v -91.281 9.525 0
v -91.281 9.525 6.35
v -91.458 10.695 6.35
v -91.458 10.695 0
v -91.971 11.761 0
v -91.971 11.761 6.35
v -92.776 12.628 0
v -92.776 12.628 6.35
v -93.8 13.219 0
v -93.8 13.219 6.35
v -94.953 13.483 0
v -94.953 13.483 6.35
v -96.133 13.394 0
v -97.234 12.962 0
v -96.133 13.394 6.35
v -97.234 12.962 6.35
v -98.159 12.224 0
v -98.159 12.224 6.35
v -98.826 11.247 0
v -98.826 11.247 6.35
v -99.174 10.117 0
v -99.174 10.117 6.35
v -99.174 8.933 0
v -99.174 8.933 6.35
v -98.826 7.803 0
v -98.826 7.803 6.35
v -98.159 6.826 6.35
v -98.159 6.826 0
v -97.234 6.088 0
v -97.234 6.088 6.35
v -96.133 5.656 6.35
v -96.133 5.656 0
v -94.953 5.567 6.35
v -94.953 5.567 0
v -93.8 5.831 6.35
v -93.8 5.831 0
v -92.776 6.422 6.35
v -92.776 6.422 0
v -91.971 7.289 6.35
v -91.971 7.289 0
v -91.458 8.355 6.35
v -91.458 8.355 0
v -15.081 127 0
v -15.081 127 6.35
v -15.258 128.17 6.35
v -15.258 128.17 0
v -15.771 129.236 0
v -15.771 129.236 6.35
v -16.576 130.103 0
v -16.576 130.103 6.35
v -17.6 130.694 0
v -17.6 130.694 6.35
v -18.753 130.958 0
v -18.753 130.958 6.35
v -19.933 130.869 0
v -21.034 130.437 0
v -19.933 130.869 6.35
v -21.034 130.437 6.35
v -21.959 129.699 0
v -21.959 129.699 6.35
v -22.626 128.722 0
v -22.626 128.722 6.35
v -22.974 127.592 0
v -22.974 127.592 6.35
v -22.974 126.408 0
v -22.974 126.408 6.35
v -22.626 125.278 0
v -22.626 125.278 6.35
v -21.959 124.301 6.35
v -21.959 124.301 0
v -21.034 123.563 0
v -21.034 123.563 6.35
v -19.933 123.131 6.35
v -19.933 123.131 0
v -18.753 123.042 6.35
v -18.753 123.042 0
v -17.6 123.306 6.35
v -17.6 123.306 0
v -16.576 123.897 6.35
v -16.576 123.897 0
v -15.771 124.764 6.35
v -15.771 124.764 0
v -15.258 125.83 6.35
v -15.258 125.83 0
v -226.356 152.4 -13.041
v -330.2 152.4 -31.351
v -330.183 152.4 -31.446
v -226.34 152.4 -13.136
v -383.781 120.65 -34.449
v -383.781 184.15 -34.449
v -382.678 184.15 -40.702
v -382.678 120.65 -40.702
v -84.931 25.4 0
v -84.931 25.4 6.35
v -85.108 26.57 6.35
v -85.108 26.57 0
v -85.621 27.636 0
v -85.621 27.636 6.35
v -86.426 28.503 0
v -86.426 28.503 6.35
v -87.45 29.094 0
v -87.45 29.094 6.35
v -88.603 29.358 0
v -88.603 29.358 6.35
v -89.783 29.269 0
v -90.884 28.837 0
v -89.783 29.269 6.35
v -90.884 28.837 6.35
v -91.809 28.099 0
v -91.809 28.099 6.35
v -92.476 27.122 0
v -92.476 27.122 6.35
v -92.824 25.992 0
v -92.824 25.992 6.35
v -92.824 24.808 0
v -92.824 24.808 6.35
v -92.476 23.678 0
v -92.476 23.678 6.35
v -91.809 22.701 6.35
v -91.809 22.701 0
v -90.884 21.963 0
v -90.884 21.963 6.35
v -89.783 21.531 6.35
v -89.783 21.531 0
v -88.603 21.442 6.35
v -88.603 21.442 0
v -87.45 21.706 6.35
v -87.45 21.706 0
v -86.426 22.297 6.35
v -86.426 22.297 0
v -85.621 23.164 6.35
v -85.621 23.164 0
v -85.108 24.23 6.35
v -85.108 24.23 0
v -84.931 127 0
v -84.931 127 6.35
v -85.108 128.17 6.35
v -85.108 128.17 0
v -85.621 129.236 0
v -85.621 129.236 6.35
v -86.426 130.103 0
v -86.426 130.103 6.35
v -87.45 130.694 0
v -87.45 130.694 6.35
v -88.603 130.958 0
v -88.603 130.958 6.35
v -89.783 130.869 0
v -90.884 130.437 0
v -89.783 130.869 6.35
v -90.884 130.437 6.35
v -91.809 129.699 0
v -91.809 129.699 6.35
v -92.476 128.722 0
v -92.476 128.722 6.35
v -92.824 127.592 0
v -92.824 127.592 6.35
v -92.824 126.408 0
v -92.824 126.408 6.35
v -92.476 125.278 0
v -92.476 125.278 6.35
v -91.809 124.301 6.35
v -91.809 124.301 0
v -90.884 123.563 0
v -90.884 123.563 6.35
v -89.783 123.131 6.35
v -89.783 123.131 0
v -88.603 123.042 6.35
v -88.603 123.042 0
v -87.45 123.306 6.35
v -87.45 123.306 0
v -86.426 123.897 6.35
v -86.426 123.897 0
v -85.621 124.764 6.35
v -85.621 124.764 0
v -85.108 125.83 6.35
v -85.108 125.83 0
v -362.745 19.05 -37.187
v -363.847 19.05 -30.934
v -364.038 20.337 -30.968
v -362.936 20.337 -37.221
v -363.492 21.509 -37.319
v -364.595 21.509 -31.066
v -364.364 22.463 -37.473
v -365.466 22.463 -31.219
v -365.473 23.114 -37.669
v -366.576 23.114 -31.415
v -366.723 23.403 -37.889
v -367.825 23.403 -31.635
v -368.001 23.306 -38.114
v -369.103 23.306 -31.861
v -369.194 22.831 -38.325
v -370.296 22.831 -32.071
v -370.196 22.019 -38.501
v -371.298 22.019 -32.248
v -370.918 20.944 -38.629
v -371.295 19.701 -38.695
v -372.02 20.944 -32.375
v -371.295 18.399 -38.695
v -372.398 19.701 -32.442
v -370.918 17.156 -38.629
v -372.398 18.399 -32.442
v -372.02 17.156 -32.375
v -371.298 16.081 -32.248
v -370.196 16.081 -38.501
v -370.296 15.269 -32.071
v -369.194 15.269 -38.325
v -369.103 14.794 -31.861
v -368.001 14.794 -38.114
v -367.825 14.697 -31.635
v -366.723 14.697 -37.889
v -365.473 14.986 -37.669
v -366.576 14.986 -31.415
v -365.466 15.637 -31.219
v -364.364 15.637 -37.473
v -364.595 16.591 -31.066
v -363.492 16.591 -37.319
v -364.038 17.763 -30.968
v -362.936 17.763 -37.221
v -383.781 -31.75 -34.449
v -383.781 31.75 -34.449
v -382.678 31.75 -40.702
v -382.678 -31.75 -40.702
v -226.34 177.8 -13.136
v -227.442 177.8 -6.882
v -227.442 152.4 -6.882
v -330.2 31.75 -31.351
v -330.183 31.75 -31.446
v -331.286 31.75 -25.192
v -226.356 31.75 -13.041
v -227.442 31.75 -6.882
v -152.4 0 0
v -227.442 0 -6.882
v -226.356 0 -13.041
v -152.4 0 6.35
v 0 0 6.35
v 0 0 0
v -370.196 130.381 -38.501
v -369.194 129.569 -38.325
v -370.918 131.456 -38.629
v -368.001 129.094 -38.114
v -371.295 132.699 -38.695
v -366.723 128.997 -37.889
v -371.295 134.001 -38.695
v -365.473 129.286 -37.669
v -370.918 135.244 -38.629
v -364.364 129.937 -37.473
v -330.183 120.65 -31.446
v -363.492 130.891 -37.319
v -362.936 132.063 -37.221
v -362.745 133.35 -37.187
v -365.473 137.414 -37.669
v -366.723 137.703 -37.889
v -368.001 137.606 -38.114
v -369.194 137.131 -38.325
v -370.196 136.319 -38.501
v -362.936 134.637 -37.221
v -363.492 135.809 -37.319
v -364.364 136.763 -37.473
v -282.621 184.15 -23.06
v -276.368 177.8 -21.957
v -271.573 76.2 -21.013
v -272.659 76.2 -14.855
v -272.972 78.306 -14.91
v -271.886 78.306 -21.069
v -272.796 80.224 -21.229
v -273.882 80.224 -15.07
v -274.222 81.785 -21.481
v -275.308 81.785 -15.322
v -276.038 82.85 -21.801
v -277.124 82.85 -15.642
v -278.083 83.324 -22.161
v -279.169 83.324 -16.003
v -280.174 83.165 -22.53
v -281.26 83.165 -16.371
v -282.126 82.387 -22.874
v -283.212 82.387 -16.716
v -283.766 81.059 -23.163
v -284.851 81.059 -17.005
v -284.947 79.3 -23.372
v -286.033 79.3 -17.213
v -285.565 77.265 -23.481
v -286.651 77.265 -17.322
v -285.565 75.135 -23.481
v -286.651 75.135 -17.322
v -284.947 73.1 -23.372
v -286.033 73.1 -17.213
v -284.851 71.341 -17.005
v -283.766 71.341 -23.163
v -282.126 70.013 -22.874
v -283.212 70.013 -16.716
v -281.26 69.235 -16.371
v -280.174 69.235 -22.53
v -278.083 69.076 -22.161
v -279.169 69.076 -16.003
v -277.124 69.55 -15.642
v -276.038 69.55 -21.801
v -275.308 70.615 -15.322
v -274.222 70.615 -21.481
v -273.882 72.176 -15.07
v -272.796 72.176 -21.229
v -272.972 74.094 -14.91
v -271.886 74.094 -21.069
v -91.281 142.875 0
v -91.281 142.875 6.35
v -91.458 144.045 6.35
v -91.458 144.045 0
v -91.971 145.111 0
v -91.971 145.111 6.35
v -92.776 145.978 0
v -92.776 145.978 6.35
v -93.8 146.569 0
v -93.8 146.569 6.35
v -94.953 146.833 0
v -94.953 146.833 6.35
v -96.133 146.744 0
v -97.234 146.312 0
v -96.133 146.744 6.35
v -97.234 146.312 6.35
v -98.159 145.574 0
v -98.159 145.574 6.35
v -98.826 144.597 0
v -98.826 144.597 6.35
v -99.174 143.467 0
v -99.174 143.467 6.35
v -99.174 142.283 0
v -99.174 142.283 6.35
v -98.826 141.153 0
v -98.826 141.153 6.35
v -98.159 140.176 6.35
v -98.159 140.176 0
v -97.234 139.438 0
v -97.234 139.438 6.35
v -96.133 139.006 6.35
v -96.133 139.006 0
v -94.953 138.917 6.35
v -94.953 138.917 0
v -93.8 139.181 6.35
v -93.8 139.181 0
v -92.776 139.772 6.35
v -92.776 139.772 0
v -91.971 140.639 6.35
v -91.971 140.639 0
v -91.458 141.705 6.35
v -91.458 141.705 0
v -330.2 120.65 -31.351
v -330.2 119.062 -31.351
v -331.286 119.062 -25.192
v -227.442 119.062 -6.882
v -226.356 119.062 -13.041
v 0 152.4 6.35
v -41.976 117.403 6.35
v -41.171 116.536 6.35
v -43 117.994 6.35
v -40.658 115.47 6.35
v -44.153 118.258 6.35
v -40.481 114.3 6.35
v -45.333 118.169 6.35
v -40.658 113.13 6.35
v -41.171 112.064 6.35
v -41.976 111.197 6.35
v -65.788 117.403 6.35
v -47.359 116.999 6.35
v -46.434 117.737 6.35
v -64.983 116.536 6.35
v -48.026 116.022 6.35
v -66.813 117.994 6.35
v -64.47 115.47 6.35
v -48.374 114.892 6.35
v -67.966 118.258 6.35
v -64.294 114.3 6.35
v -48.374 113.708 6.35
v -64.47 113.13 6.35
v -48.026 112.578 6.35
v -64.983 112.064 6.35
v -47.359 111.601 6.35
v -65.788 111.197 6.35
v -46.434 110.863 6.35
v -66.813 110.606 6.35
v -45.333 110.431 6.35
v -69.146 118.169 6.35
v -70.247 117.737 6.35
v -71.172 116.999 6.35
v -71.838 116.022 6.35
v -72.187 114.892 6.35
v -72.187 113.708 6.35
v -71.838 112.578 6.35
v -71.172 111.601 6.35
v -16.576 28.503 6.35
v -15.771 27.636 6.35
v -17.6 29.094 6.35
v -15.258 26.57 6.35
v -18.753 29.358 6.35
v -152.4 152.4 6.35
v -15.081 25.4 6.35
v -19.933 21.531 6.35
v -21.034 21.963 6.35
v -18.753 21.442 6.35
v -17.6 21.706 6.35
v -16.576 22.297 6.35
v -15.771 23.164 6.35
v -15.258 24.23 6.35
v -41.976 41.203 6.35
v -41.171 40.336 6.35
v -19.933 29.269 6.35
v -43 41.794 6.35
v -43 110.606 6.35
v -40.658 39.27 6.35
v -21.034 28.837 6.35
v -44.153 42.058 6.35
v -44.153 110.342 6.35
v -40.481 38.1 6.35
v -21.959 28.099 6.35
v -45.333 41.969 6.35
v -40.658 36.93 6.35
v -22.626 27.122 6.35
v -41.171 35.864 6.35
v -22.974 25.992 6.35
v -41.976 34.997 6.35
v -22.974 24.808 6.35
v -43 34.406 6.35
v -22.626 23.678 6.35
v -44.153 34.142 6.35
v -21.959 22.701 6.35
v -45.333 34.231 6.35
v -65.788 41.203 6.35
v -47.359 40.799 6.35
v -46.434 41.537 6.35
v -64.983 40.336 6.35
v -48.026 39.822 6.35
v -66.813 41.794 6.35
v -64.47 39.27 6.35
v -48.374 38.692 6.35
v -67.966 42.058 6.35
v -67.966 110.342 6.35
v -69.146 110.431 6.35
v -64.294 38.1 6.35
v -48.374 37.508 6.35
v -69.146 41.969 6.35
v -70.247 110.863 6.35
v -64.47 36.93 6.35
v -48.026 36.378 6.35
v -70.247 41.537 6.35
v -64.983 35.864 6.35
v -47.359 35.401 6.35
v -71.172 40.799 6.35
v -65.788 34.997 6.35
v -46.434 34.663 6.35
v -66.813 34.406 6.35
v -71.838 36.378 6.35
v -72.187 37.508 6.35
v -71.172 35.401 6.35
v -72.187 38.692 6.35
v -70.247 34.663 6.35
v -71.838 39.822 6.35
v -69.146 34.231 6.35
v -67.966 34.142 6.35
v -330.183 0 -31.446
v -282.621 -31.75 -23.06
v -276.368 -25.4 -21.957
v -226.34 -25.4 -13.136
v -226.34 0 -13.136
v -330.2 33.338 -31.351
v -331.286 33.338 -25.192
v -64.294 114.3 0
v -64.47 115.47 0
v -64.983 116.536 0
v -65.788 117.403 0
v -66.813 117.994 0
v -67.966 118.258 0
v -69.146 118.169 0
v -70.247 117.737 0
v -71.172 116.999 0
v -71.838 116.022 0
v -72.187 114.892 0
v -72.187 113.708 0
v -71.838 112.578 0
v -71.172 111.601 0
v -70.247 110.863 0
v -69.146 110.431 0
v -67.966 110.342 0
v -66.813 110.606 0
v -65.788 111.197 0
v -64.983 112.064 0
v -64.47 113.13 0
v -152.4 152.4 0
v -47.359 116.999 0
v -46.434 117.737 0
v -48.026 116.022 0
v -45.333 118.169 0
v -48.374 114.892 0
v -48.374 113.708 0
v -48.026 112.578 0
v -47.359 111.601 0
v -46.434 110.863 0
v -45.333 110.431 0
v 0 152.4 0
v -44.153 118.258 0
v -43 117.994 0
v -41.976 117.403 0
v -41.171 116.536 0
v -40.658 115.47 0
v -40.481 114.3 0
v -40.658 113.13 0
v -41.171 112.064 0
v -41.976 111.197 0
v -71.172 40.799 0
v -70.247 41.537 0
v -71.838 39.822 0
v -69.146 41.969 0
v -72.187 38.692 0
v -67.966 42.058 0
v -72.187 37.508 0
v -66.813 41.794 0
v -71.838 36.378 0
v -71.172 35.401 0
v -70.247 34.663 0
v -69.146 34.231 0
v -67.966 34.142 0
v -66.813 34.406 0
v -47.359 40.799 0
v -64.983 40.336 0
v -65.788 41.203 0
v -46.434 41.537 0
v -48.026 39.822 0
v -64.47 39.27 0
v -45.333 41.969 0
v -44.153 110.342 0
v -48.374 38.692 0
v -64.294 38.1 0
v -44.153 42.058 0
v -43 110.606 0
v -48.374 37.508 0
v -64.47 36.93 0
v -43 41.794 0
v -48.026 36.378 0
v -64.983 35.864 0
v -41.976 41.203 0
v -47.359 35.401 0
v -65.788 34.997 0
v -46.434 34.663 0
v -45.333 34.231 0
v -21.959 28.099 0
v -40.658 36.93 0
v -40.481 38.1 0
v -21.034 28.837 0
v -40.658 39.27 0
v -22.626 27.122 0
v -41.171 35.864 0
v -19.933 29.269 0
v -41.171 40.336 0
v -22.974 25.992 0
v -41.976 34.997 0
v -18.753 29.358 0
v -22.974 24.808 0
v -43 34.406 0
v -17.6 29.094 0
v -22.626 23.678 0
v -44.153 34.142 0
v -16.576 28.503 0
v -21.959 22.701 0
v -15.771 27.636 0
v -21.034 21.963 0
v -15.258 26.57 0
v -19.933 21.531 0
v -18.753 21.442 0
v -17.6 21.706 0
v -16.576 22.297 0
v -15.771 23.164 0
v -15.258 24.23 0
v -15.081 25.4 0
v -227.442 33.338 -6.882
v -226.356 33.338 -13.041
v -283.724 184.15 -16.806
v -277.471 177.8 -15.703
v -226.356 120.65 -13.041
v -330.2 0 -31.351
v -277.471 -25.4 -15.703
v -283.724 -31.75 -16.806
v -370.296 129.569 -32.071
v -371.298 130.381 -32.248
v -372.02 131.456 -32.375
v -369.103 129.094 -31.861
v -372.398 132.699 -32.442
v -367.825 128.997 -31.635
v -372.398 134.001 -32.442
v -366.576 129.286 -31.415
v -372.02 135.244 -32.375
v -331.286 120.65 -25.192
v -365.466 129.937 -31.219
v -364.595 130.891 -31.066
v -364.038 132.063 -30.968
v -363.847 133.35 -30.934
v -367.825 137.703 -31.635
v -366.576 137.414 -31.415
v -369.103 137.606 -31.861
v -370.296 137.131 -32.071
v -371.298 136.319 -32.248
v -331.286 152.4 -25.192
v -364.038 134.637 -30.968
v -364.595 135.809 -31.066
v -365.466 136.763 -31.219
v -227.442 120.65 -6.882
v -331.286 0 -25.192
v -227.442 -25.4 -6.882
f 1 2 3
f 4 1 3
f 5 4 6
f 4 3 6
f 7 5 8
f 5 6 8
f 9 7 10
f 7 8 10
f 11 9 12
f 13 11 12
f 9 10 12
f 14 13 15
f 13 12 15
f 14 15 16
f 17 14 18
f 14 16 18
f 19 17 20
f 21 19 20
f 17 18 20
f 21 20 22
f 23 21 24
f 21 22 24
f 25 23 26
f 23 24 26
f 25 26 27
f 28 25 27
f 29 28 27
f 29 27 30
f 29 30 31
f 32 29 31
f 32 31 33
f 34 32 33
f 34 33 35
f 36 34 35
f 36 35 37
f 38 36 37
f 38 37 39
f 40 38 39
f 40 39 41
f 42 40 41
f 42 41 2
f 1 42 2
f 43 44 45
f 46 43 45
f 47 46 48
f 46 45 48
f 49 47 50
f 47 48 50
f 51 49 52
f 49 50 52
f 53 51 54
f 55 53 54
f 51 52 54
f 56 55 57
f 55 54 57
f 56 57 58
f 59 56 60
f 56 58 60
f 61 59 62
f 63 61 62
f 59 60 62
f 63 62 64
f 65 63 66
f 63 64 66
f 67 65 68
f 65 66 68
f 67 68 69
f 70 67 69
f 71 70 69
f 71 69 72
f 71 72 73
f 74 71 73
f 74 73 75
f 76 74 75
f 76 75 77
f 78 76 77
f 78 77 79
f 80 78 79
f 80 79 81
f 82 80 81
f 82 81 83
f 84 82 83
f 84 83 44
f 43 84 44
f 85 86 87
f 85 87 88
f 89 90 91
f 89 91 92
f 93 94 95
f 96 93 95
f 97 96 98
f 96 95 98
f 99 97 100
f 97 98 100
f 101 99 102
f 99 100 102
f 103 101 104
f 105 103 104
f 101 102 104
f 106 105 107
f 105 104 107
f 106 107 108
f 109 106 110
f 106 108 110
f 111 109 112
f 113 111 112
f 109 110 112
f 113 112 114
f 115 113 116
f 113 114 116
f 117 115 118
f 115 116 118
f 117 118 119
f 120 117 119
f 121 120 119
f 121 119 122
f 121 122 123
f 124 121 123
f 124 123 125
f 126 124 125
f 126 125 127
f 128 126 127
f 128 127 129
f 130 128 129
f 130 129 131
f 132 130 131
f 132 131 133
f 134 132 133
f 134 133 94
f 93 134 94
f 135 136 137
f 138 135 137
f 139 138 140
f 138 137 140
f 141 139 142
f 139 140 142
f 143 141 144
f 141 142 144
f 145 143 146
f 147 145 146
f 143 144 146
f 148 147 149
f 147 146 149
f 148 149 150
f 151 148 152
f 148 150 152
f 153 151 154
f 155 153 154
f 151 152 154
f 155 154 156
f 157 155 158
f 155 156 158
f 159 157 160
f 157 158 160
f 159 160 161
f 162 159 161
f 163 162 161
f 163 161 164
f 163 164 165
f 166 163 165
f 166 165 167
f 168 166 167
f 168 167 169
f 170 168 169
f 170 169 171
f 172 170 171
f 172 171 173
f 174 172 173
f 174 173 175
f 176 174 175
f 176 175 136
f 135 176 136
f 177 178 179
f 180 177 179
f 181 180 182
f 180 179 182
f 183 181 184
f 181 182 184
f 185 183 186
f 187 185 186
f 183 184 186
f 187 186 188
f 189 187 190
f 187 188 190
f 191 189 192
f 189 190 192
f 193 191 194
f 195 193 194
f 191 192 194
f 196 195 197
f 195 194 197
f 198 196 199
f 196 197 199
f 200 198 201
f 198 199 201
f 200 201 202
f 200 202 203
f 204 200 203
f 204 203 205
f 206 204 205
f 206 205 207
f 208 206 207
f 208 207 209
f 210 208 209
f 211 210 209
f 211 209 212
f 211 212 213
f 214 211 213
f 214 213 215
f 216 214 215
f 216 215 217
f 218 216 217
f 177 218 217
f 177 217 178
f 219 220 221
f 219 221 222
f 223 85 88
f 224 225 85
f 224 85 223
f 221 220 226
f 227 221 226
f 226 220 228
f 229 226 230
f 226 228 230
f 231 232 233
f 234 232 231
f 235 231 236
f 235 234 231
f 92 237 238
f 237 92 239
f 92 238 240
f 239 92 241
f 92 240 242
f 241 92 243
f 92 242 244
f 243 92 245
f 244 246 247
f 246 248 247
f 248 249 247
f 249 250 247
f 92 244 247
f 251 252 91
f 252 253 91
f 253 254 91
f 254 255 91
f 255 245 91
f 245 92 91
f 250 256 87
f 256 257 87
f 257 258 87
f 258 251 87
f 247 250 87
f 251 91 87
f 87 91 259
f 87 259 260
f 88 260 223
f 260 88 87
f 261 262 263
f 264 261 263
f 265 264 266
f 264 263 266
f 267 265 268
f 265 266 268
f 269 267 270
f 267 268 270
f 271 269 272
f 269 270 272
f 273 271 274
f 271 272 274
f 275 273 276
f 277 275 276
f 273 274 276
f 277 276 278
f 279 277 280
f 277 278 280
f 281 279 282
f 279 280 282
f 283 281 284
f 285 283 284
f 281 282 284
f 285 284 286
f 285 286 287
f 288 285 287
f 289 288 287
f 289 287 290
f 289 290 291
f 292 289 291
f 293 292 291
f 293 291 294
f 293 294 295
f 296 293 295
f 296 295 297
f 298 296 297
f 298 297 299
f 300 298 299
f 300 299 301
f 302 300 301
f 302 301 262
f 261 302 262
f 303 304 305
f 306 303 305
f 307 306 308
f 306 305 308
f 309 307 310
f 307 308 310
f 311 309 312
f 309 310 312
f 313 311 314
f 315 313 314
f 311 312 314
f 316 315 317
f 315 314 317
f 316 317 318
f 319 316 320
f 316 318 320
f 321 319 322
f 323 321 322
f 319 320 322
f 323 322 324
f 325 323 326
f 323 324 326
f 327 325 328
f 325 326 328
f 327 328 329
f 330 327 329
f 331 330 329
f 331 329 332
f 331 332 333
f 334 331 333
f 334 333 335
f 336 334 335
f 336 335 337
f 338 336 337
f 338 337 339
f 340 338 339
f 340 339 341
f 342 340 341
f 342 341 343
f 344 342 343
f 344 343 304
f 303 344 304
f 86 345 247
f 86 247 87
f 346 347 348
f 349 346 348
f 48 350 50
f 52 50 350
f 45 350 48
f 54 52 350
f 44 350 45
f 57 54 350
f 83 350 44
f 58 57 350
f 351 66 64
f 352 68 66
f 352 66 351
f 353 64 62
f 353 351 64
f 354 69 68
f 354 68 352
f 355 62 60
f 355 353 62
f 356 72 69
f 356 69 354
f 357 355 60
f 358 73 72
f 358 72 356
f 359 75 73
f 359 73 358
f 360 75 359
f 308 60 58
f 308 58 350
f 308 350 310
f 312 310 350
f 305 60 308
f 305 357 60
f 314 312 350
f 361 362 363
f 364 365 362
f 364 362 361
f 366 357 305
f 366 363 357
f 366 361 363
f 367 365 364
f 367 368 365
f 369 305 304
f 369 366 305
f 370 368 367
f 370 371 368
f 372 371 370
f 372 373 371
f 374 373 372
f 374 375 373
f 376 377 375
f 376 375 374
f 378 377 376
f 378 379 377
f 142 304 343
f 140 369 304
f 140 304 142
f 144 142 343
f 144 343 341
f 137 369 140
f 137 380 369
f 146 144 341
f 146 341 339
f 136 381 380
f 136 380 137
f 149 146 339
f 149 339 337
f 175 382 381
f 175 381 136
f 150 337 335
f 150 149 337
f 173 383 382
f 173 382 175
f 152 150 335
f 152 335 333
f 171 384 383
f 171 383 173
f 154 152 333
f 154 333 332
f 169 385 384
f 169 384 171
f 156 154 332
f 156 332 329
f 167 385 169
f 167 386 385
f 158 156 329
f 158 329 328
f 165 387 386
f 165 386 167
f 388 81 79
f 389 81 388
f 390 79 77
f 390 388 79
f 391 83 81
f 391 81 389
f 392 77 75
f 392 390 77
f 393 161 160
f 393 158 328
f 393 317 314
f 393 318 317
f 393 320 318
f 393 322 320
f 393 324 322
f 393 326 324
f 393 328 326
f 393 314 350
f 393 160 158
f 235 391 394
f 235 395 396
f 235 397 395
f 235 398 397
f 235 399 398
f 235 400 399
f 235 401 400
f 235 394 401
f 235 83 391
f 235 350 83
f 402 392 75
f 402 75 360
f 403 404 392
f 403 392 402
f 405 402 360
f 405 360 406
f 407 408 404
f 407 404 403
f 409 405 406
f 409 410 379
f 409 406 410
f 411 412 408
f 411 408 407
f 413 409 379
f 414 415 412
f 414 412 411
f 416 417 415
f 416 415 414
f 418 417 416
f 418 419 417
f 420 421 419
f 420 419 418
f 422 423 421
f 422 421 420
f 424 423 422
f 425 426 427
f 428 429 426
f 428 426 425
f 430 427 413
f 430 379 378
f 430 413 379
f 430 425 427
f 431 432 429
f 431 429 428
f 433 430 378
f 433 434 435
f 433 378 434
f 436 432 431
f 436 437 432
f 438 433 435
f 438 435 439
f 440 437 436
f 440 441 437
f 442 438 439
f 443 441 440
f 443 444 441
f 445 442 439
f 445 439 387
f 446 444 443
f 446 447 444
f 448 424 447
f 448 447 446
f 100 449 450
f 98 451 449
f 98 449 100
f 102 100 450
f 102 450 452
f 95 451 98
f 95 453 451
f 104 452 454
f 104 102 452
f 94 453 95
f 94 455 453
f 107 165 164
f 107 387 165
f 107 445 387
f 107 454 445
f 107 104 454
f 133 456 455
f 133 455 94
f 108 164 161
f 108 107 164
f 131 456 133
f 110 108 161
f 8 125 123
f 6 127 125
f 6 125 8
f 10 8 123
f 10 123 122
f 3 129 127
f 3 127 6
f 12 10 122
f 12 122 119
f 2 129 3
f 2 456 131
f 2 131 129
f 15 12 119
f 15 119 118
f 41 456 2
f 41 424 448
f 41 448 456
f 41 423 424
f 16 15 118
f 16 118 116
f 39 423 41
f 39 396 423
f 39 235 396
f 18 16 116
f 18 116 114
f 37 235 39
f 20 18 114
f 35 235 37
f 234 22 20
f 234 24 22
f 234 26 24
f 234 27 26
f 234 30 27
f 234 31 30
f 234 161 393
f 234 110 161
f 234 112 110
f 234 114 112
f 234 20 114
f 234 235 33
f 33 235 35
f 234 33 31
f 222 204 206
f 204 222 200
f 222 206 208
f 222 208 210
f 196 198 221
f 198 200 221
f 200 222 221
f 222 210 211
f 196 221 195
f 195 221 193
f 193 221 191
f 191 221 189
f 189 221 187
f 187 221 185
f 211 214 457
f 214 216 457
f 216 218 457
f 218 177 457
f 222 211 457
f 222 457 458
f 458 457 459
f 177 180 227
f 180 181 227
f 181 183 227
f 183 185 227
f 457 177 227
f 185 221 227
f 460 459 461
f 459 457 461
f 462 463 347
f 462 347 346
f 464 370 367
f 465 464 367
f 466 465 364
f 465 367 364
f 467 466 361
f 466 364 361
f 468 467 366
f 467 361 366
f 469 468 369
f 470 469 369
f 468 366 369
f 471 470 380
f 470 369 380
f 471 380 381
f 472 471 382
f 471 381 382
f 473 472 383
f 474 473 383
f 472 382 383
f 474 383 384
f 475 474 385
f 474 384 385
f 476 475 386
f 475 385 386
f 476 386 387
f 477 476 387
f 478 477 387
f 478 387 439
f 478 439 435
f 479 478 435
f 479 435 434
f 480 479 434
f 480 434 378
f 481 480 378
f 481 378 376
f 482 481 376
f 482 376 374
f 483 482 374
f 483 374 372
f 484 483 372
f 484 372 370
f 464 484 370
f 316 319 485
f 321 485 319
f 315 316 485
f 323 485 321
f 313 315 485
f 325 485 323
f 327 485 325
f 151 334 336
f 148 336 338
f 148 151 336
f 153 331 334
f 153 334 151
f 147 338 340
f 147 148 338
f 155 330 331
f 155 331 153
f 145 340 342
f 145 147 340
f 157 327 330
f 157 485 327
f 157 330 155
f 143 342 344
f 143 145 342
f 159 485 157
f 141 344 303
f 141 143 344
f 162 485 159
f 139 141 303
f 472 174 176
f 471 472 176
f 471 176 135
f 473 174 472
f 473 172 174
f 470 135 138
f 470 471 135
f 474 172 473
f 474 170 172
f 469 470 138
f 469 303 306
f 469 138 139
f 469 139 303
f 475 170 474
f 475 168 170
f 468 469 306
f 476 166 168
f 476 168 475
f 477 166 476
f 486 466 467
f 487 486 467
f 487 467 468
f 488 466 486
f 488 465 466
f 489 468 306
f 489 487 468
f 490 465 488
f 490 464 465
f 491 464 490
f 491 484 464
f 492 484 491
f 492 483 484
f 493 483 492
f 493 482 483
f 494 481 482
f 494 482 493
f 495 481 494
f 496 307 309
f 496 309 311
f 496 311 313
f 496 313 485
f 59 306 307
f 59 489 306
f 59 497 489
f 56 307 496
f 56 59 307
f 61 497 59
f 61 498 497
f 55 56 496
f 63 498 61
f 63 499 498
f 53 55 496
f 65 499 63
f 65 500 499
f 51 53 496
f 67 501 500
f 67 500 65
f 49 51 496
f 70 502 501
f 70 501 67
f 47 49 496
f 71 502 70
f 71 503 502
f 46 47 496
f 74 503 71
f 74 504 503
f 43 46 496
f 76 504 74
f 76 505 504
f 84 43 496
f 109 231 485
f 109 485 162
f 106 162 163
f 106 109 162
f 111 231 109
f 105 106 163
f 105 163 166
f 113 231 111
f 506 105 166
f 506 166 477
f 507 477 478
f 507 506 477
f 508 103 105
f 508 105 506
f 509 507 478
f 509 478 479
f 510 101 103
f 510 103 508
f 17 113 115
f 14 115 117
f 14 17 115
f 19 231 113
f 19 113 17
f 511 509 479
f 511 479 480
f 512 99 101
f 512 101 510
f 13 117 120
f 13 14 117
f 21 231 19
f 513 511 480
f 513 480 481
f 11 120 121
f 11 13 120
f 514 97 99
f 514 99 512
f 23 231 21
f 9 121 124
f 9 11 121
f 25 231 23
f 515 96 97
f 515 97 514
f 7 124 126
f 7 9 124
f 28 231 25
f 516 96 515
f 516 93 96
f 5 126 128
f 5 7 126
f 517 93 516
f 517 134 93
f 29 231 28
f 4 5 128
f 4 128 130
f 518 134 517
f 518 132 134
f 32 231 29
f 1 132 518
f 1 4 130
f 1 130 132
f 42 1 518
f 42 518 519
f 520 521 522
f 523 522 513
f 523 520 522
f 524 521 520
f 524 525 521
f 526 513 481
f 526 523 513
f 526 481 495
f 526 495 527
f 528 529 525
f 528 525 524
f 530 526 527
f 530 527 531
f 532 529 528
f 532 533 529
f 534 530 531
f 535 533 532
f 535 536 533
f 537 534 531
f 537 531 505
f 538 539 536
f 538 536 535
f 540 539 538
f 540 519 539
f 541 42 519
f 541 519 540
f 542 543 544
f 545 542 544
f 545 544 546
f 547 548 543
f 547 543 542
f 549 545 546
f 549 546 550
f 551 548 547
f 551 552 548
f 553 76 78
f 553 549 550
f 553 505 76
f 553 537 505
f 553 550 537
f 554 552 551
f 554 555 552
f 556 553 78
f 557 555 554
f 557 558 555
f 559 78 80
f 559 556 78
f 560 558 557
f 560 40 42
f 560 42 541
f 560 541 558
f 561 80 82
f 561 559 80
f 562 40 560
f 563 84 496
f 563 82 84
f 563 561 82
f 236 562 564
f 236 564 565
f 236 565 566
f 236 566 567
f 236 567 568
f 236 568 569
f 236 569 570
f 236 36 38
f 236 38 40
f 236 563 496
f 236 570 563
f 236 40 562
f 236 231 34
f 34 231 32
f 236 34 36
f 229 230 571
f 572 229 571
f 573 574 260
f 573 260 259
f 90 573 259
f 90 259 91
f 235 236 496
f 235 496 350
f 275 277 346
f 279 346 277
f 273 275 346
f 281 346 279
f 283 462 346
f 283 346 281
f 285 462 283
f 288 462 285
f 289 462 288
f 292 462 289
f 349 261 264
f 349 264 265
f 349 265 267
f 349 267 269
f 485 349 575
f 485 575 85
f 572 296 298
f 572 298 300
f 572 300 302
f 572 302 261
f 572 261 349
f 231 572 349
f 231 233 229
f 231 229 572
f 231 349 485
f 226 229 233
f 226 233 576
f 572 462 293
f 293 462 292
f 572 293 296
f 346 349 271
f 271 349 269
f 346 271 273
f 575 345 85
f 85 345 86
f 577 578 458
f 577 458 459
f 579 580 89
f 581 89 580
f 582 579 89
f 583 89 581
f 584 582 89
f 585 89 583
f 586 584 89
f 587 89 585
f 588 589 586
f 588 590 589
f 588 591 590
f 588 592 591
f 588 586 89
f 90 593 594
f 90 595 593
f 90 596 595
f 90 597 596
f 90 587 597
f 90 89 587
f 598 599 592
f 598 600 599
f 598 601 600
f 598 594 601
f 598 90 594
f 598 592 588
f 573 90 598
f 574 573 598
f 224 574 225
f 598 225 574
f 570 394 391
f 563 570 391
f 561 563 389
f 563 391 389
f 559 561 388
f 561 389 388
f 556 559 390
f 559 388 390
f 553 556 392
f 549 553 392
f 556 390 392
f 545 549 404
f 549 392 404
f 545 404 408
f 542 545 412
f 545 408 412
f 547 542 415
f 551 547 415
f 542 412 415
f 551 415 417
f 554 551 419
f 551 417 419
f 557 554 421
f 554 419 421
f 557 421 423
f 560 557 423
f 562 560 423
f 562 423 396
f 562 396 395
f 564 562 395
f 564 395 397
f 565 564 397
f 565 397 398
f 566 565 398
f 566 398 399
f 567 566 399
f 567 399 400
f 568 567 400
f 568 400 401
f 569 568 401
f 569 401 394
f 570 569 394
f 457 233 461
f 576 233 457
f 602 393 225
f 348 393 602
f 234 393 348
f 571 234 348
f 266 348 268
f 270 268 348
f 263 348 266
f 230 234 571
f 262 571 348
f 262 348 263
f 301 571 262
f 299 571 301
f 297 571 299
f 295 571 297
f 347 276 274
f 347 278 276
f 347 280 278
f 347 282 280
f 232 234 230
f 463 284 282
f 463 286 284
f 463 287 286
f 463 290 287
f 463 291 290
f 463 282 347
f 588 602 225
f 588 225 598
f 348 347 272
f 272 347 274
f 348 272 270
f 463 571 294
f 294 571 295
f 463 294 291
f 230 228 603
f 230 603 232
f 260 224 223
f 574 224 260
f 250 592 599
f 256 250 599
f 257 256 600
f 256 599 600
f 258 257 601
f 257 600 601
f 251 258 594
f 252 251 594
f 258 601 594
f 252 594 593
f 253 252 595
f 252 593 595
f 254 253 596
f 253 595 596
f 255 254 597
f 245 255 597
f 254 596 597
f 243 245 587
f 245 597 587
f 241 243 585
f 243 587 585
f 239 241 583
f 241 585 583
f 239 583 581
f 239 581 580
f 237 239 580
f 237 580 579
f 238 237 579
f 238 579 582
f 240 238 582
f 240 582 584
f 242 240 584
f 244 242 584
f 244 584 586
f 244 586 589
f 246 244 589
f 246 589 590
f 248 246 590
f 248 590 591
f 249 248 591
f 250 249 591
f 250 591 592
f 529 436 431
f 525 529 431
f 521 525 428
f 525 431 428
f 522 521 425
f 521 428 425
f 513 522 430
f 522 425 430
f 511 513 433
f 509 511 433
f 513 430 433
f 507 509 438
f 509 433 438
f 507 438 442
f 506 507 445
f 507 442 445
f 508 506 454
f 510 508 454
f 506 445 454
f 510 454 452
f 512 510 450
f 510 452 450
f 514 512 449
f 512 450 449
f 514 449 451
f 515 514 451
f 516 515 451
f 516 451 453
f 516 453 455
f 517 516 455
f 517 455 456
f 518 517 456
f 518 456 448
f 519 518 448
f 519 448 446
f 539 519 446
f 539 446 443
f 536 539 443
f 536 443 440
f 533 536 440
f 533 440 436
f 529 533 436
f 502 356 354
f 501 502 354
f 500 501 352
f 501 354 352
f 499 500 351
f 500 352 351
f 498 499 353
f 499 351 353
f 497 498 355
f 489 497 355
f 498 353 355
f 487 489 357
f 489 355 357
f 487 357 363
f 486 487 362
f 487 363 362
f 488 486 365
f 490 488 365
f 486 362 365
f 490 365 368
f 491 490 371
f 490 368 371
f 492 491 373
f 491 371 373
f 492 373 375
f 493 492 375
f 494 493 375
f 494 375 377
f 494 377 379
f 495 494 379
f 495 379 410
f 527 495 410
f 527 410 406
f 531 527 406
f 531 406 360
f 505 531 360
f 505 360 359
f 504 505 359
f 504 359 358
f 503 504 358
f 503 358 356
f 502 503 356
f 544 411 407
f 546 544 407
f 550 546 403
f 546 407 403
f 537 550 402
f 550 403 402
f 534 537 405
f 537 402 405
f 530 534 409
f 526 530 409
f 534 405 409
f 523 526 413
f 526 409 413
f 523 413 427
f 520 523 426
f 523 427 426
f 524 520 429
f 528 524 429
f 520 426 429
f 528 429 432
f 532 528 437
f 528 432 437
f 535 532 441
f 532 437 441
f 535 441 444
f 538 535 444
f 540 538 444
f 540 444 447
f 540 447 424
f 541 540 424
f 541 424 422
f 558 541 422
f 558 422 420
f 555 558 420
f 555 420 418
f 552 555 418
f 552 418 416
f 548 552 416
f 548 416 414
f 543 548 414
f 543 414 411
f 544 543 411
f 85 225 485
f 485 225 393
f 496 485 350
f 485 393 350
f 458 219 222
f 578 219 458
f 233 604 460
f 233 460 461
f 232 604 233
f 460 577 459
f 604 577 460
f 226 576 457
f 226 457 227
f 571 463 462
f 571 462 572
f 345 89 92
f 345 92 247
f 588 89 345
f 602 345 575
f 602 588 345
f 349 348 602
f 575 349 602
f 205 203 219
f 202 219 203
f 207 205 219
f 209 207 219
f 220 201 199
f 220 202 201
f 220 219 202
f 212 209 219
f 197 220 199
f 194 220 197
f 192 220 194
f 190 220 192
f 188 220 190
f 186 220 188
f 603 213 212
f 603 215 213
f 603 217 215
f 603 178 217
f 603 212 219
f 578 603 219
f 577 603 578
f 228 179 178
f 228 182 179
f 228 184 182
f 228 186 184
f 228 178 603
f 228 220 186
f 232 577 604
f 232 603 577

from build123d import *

# Parameters (mm, degrees)
F1_DEPTH = 152.4
F2_R     = 7.14375
F3_DEPTH = 63.5931574972
F4_R     = 3.96875
F5_DEPTH = 37.70193717
F7_DEPTH = 6.35
F8_R     = 4.365625
F8_W     = 105.4455175215
F8_H     = 1.5875
F9_DEPTH = 72.8023226846


with BuildPart() as f1:
    # F0 (on Front) → F1 (new body)
    with BuildSketch(Plane.XZ):
        Polygon((-152.4, 0), (0, 0), (0, 6.35), (-152.4, 6.35), (-331.2859139551, -25.192413099), (-330.2, -31.35093717), align=None)
    extrude(amount=-F1_DEPTH)

    # F2 (on face) → F3 (cut, through all)
    with BuildSketch(Plane(origin=(-5.6813362512, 0, 32.2204589924), x_dir=(0.984807753, 0, 0.1736481777), z_dir=(-0.1736481777, 0, 0.984807753))):
        with Locations((-278.2400531523, 76.2)):
            Circle(F2_R)
    extrude(amount=-F3_DEPTH, mode=Mode.SUBTRACT)

    # F4 (on face) → F5 (cut, through all)
    with BuildSketch(Plane.XY.offset(6.35)):
        with Locations((-19.05, 127)):
            Circle(F4_R)
        with Locations((-19.05, 25.4)):
            Circle(F4_R)
        with Locations((-88.9, 25.4)):
            Circle(F4_R)
        with Locations((-88.9, 127)):
            Circle(F4_R)
        with Locations((-95.25, 9.525)):
            Circle(F4_R)
        with Locations((-95.25, 142.875)):
            Circle(F4_R)
        with Locations((-68.2625, 114.3)):
            Circle(F4_R)
        with Locations((-44.45, 114.3)):
            Circle(F4_R)
        with Locations((-68.2625, 38.1)):
            Circle(F4_R)
        with Locations((-44.45, 38.1)):
            Circle(F4_R)
    extrude(amount=-F5_DEPTH, mode=Mode.SUBTRACT)

    # F6 (on face) → F7 (join)
    with BuildSketch(Plane(origin=(-5.6813362512, 0, 32.2204589924), x_dir=(0.984807753, 0, 0.1736481777), z_dir=(-0.1736481777, 0, 0.984807753))):
        Polygon((-330.6275531523, 120.65), (-330.6275531523, 152.4), (-225.1820356309, 152.4), (-225.1820356309, 177.8), (-275.9820356309, 177.8), (-282.3320356309, 184.15), (-383.9320356309, 184.15), (-383.9320356309, 120.65), align=None)
        Polygon((-383.9320356309, -31.75), (-282.3320356309, -31.75), (-275.9820356309, -25.4), (-225.1820356309, -25.4), (-225.1820356309, 0), (-330.6275531523, 0), (-330.6275531523, 31.75), (-383.9320356309, 31.75), align=None)
    extrude(amount=-F7_DEPTH)

    # F8 (on face) → F9 (cut, through all)
    with BuildSketch(Plane(origin=(-5.6813362512, 0, 32.2204589924), x_dir=(0.984807753, 0, 0.1736481777), z_dir=(-0.1736481777, 0, 0.984807753))):
        with Locations((-368.0570356309, 133.35)):
            Circle(F8_R)
        with Locations((-368.0570356309, 19.05)):
            Circle(F8_R)
        with Locations((-277.9047943916, 119.85625)):
            Rectangle(F8_W, F8_H)
        with Locations((-277.9047943916, 32.54375)):
            Rectangle(F8_W, F8_H)
    extrude(amount=-F9_DEPTH, mode=Mode.SUBTRACT)


solid = f1.part
